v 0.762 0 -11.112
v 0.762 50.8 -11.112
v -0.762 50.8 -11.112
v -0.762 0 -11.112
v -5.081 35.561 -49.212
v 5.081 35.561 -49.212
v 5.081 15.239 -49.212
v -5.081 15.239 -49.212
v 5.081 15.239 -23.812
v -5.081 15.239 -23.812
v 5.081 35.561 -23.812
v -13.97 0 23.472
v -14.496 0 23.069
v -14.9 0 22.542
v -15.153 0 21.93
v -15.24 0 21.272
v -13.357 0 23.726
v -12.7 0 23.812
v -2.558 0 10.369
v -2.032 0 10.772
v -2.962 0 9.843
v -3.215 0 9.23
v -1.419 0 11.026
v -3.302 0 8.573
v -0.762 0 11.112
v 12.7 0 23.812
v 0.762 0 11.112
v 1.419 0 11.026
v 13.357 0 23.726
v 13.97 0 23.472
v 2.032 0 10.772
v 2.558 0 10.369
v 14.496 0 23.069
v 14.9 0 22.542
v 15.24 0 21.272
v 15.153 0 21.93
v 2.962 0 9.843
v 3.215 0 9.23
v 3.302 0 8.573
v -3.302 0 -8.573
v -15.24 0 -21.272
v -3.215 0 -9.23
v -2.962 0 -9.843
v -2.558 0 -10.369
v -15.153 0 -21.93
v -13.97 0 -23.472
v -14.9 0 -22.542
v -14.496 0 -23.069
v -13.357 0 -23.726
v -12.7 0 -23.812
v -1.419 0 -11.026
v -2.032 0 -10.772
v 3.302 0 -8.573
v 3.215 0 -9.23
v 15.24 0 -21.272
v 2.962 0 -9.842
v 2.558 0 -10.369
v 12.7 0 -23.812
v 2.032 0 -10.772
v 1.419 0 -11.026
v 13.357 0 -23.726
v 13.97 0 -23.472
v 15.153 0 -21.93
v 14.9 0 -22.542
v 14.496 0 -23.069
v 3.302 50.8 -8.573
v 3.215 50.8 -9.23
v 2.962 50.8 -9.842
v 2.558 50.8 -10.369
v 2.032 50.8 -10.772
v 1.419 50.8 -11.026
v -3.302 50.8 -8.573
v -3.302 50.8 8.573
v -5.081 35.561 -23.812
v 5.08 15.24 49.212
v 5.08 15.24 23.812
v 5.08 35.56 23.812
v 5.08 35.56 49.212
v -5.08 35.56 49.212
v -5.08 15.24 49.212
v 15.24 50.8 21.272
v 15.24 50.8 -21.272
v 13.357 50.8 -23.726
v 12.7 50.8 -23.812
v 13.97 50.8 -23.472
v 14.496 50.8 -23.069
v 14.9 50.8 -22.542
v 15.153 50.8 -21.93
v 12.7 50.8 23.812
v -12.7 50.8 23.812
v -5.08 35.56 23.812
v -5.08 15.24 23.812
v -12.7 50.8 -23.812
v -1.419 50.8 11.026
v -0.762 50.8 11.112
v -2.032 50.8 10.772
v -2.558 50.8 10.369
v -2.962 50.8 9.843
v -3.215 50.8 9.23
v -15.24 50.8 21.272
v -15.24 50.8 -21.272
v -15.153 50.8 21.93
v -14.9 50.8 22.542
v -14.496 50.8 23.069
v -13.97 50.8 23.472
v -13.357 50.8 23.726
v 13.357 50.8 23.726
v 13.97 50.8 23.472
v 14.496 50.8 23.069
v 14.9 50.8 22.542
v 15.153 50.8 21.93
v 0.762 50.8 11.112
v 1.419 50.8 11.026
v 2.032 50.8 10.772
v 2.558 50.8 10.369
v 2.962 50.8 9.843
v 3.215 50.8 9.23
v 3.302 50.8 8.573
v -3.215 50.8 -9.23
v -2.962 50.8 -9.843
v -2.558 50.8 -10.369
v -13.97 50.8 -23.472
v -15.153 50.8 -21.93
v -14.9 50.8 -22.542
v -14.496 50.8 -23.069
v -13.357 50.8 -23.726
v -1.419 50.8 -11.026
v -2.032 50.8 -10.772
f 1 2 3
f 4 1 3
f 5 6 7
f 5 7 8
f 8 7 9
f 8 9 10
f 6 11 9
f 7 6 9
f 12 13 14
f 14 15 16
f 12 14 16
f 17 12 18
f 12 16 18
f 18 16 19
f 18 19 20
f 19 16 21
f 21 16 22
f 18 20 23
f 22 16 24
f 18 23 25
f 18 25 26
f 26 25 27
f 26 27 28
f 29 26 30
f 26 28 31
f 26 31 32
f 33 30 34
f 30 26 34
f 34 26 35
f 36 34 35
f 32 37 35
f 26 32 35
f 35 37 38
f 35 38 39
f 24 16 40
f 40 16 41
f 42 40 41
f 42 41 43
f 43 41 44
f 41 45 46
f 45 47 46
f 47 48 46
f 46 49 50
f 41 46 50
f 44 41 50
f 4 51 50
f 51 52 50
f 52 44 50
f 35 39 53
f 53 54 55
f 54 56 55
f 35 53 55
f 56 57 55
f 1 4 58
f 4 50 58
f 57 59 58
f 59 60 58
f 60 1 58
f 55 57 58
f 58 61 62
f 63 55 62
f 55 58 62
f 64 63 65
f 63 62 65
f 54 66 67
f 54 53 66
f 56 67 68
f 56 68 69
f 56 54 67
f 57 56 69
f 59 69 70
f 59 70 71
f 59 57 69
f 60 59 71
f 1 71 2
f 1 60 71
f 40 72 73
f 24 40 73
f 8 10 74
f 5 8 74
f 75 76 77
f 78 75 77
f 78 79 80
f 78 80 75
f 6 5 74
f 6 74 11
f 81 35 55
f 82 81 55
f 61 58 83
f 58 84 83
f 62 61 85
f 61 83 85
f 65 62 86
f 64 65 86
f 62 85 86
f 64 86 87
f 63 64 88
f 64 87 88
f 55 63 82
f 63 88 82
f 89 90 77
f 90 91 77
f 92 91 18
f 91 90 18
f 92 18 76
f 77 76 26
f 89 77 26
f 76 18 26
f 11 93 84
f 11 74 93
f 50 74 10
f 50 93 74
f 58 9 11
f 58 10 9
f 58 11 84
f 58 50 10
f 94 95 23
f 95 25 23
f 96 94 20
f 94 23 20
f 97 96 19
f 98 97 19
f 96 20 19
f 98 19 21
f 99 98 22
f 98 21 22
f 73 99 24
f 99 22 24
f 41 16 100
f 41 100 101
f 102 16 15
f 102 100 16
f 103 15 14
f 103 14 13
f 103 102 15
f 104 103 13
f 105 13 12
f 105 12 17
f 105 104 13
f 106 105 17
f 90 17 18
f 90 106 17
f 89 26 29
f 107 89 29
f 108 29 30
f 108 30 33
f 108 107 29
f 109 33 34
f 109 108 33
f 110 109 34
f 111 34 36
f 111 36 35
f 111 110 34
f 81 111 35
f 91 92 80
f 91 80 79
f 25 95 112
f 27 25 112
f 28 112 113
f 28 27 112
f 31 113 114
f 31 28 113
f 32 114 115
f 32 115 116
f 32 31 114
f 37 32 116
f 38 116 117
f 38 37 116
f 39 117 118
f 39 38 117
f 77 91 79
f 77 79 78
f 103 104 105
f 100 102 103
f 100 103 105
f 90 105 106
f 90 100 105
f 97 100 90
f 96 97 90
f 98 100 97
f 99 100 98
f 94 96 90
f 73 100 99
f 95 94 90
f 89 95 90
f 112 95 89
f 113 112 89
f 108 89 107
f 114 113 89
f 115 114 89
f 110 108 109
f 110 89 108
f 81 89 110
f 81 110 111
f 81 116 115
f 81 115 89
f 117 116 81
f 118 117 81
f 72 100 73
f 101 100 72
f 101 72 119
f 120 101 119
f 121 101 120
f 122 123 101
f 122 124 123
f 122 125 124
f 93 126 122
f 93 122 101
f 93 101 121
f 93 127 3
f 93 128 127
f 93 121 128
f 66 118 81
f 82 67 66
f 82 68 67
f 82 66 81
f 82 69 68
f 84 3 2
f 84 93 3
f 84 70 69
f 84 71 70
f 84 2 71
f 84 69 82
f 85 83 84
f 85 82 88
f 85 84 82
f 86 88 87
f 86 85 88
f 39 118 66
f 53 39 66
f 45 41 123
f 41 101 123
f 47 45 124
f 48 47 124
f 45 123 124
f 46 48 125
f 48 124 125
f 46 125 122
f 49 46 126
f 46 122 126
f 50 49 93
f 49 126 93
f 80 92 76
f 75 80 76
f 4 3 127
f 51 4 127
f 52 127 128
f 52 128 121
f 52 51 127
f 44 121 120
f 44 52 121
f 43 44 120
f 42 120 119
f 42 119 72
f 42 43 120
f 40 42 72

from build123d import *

# Parameters (mm, degrees)
SKETCH1_W           = 30.48
SKETCH1_H           = 47.625
BOSS_EXTRUDE1_DEPTH = 50.8
CUT_EXTRUDE1_DEPTH  = 50.8
FILLET1_R           = 2.54
FILLET2_R           = 2.54
BOSS_EXTRUDE2_DEPTH = 25.4
SKETCH4_W           = 10.16
SKETCH4_H           = 20.32
BOSS_EXTRUDE3_DEPTH = 25.4


with BuildPart() as part:
    # Sketch1 → Boss-Extrude1 (new body)
    with BuildSketch(Plane(origin=(0, 0, 0), x_dir=(1, 0, 0), z_dir=(0, 1, 0))):
        Rectangle(SKETCH1_W, SKETCH1_H)
    extrude(amount=BOSS_EXTRUDE1_DEPTH)

    # Sketch2 → Cut-Extrude1 (cut)
    with BuildSketch(Plane(origin=(0, 50.8, 0), x_dir=(1, 0, 0), z_dir=(0, 1, 0))):
        Polygon((3.302, -5.159375), (-3.302, 5.159375), (-3.302, 0), (-3.302, -11.1125), (3.302, -11.1125), align=None)
        Polygon((-3.302, 11.1125), (-3.302, 5.159375), (3.302, -5.159375), (3.302, 0), (3.302, 11.1125), (0, 11.1125), align=None)
    extrude(amount=-CUT_EXTRUDE1_DEPTH, mode=Mode.SUBTRACT)

    # Fillet1
    fillet1_edges = [part.edges().sort_by_distance(p)[0] for p in [
        (-3.302, 25.4, 11.1125),
        (-3.302, 25.4, -11.1125),
        (3.302, 25.4, -11.1125),
        (3.302, 25.4, 11.1125),
    ]]
    fillet(fillet1_edges, radius=FILLET1_R)

    # Fillet2
    fillet2_edges = [part.edges().sort_by_distance(p)[0] for p in [
        (15.24, 25.4, 23.8125),
        (-15.24, 25.4, 23.8125),
        (-15.24, 25.4, -23.8125),
        (15.24, 25.4, -23.8125),
    ]]
    fillet(fillet2_edges, radius=FILLET2_R)

    # Sketch3 → Boss-Extrude2 (add)
    with BuildSketch(Plane(origin=(0, 0, -23.8125), x_dir=(-1, 0, 0), z_dir=(0, 0, -1))):
        Polygon((-5.080578249, 35.561156499), (-5.080578249, 15.238843501), (5.080578249, 35.561156499), align=None)
        Polygon((5.080578249, 35.561156499), (-5.080578249, 15.238843501), (5.080578249, 15.238843501), align=None)
    extrude(amount=BOSS_EXTRUDE2_DEPTH)

    # Sketch4 → Boss-Extrude3 (add)
    with BuildSketch(Plane.XY.offset(23.8125)):
        with Locations((0, 25.4)):
            Rectangle(SKETCH4_W, SKETCH4_H)
    extrude(amount=BOSS_EXTRUDE3_DEPTH)


solid = part.part
